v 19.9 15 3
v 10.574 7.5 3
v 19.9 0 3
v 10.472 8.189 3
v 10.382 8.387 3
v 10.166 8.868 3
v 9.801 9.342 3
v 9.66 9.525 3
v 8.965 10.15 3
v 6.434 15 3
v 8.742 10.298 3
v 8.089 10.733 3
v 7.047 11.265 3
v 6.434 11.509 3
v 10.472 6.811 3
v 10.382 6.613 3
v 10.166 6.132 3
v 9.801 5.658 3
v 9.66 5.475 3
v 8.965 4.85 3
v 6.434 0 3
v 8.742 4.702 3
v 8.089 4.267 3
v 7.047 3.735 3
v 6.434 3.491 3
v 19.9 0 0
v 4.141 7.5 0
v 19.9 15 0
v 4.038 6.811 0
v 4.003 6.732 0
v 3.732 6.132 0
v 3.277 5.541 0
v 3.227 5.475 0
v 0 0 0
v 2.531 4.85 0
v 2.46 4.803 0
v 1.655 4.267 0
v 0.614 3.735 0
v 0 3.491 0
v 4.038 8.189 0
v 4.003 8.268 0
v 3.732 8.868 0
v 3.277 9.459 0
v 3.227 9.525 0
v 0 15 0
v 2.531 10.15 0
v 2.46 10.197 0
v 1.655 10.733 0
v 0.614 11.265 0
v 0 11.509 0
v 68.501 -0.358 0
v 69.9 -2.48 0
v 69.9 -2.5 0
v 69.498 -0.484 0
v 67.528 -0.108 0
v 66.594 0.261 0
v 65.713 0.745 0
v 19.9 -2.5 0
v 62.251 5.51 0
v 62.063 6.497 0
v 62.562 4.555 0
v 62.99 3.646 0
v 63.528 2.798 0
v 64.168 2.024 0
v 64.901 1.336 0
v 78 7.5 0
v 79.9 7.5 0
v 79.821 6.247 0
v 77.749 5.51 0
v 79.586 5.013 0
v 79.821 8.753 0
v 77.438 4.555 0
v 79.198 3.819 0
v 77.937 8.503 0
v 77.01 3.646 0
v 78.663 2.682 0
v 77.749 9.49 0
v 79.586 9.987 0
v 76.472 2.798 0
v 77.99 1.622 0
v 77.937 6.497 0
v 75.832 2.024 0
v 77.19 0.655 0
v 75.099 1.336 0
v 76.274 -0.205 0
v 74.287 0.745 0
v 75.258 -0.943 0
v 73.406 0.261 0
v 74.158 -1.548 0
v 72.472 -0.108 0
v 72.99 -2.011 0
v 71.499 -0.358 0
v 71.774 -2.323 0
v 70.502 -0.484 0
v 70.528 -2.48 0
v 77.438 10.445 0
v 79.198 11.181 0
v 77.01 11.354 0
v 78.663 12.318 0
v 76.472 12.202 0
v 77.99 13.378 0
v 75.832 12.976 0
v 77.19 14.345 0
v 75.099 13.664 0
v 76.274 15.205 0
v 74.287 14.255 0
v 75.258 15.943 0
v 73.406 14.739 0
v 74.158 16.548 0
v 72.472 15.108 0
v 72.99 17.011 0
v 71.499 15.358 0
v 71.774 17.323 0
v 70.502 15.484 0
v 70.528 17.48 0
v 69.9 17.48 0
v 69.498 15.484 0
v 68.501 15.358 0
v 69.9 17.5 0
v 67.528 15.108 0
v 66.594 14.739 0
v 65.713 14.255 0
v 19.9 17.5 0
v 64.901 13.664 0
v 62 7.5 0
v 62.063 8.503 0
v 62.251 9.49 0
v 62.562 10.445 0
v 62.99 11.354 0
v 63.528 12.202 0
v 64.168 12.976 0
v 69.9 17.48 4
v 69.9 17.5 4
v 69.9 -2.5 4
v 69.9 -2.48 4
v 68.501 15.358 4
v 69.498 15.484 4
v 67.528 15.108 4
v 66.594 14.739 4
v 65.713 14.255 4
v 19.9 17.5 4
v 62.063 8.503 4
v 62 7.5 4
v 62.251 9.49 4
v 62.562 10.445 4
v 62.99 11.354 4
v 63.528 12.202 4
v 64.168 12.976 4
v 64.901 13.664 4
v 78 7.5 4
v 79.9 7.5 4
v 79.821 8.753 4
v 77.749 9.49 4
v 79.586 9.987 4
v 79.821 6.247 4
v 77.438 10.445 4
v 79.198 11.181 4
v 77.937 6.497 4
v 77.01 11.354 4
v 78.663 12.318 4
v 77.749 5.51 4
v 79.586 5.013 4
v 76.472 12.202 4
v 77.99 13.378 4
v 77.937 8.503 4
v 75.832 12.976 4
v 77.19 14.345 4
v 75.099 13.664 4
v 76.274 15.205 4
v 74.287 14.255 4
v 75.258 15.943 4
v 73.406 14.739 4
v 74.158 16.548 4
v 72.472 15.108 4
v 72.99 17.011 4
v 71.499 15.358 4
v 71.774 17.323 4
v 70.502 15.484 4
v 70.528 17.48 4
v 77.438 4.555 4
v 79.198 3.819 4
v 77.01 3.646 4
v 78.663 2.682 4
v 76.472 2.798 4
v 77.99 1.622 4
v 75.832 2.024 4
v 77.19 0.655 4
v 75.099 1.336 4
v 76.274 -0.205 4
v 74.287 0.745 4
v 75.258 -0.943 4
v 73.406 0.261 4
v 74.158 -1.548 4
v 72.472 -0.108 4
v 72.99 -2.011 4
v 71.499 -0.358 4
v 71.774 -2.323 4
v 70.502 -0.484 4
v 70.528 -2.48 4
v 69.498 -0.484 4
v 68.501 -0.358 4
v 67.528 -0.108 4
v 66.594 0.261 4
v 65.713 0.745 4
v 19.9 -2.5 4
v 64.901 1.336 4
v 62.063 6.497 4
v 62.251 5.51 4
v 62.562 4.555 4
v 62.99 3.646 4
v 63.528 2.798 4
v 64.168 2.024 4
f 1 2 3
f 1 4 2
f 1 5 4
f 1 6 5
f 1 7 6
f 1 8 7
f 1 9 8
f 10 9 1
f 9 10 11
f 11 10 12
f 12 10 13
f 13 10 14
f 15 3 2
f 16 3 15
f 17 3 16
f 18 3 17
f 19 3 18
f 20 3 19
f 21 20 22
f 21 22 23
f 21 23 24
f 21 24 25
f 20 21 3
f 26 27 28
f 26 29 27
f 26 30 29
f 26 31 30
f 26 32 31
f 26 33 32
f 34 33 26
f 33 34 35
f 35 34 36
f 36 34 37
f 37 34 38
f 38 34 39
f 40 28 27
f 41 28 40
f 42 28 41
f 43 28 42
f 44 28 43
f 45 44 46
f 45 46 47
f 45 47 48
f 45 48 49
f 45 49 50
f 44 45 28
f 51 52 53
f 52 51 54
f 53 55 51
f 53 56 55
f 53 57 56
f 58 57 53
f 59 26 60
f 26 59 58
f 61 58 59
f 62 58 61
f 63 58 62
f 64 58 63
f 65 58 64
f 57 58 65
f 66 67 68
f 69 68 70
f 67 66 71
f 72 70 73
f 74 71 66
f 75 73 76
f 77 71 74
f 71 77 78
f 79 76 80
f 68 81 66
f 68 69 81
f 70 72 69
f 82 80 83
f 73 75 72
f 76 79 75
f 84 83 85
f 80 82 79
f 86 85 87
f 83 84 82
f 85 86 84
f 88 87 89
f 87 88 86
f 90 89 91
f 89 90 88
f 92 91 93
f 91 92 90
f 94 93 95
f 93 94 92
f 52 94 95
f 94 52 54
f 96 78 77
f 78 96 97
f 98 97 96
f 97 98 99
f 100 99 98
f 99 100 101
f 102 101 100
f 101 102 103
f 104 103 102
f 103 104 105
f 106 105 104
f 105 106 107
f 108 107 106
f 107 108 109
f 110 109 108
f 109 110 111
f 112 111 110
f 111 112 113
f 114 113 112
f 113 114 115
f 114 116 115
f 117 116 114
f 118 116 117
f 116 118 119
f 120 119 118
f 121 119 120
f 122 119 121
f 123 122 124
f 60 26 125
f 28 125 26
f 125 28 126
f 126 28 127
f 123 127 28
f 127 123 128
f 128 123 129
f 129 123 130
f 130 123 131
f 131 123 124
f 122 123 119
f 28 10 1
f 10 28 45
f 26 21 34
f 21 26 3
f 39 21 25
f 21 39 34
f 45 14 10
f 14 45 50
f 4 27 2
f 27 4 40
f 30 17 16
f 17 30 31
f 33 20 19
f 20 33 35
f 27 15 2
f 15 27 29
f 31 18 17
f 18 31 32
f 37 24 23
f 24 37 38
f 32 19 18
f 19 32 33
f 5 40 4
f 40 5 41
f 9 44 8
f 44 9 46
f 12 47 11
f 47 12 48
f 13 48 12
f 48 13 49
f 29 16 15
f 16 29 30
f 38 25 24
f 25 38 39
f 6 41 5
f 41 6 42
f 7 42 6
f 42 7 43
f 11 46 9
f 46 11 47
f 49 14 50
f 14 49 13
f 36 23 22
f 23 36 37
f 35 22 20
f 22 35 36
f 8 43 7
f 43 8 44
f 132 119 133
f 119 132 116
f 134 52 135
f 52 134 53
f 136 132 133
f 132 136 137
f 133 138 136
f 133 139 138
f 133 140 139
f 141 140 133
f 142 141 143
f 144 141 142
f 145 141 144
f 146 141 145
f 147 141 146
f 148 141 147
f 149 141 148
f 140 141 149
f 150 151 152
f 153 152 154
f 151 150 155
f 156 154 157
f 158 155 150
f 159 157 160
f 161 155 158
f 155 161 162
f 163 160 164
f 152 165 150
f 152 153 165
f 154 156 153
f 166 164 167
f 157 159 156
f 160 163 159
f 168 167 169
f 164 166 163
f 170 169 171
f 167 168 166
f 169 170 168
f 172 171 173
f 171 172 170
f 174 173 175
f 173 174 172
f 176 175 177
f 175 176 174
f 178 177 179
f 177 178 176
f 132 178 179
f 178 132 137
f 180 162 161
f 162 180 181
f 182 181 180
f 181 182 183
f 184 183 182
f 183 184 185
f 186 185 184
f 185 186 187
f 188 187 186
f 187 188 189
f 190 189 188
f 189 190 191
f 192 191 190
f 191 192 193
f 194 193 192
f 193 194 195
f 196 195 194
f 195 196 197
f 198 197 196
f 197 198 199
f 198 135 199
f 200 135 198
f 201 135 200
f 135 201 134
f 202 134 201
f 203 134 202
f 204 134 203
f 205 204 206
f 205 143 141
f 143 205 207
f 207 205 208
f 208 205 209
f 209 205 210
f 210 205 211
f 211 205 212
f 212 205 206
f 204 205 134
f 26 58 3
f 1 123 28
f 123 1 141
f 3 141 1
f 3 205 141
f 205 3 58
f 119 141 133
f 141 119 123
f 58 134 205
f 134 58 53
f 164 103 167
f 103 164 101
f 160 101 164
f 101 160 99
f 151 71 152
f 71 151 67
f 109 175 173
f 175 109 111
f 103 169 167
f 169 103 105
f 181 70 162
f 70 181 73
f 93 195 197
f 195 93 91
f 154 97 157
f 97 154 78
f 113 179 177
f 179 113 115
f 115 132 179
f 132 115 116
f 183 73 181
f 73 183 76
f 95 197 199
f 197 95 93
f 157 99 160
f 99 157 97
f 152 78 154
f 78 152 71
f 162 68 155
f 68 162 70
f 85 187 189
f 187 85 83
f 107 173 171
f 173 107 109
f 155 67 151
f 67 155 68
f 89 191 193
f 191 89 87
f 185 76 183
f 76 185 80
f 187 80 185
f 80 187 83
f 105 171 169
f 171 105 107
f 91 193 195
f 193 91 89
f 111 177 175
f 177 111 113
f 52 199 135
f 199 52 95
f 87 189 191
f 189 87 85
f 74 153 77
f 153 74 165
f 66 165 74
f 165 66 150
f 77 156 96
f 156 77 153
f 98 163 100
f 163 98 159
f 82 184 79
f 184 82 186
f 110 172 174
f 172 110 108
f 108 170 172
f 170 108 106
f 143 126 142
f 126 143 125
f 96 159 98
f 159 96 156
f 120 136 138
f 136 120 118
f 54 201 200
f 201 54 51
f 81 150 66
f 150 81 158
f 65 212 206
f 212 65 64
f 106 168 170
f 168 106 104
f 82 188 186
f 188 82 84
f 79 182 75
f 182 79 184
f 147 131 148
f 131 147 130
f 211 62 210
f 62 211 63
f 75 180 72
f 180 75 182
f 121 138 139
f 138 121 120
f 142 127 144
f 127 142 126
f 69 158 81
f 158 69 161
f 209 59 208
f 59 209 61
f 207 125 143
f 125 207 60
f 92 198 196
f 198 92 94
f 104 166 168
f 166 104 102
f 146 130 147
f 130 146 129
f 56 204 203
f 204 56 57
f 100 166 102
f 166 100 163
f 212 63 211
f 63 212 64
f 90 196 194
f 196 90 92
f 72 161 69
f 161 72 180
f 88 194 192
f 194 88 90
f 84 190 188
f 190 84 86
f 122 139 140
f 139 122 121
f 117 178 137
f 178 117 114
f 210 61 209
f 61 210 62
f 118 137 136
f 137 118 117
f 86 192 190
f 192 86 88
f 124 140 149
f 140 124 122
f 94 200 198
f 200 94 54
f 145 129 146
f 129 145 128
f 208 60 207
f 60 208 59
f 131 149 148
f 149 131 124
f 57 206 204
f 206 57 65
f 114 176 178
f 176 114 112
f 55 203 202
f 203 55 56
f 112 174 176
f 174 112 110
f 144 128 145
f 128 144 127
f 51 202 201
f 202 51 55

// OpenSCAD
// [FL_INDEX: keywords="openscad, 3d_parametric, Pop_Can_Opener, csg_solid" | COT="Parametric OpenSCAD design from 3DCodeverse"]
// Title: Pop Can Opener

handleL=50;
handleW=20;
handleH=4;
spadeL=20;
spadeW=15;
spadeH=3;
tineW=2;
tineAngle=25;
keyringT=2;

difference(){
union(){
difference(){

	cube([spadeL,spadeW,spadeH]);
	//translate([0,spadeW/2,-1])
	//	cylinder(r=spadeW/2-tineW,h=spadeH+2,$fn=50);
	rotate([0,-tineAngle,0])
		translate([0,-1,0])
			cube([spadeL,spadeW+2,spadeH*2]);
	rotate([0,90-tineAngle,0])
	translate([-spadeW/4,spadeW/2,-1])
		cylinder(r=spadeW/2-tineW,h=spadeL*2,$fn=50);
}
translate([spadeL-0.1,(spadeW-handleW)/2,0]){
	cube([handleL,handleW,handleH]);
	translate([handleL,handleW/2,0])
		cylinder(r=handleW/2,h=handleH,$fn=50);
}
}
translate([spadeL+handleL,handleW/2-(handleW-spadeW)/2,-1])
	cylinder(r=handleW/2-keyringT,h=handleH+2,$fn=50);
}
	
